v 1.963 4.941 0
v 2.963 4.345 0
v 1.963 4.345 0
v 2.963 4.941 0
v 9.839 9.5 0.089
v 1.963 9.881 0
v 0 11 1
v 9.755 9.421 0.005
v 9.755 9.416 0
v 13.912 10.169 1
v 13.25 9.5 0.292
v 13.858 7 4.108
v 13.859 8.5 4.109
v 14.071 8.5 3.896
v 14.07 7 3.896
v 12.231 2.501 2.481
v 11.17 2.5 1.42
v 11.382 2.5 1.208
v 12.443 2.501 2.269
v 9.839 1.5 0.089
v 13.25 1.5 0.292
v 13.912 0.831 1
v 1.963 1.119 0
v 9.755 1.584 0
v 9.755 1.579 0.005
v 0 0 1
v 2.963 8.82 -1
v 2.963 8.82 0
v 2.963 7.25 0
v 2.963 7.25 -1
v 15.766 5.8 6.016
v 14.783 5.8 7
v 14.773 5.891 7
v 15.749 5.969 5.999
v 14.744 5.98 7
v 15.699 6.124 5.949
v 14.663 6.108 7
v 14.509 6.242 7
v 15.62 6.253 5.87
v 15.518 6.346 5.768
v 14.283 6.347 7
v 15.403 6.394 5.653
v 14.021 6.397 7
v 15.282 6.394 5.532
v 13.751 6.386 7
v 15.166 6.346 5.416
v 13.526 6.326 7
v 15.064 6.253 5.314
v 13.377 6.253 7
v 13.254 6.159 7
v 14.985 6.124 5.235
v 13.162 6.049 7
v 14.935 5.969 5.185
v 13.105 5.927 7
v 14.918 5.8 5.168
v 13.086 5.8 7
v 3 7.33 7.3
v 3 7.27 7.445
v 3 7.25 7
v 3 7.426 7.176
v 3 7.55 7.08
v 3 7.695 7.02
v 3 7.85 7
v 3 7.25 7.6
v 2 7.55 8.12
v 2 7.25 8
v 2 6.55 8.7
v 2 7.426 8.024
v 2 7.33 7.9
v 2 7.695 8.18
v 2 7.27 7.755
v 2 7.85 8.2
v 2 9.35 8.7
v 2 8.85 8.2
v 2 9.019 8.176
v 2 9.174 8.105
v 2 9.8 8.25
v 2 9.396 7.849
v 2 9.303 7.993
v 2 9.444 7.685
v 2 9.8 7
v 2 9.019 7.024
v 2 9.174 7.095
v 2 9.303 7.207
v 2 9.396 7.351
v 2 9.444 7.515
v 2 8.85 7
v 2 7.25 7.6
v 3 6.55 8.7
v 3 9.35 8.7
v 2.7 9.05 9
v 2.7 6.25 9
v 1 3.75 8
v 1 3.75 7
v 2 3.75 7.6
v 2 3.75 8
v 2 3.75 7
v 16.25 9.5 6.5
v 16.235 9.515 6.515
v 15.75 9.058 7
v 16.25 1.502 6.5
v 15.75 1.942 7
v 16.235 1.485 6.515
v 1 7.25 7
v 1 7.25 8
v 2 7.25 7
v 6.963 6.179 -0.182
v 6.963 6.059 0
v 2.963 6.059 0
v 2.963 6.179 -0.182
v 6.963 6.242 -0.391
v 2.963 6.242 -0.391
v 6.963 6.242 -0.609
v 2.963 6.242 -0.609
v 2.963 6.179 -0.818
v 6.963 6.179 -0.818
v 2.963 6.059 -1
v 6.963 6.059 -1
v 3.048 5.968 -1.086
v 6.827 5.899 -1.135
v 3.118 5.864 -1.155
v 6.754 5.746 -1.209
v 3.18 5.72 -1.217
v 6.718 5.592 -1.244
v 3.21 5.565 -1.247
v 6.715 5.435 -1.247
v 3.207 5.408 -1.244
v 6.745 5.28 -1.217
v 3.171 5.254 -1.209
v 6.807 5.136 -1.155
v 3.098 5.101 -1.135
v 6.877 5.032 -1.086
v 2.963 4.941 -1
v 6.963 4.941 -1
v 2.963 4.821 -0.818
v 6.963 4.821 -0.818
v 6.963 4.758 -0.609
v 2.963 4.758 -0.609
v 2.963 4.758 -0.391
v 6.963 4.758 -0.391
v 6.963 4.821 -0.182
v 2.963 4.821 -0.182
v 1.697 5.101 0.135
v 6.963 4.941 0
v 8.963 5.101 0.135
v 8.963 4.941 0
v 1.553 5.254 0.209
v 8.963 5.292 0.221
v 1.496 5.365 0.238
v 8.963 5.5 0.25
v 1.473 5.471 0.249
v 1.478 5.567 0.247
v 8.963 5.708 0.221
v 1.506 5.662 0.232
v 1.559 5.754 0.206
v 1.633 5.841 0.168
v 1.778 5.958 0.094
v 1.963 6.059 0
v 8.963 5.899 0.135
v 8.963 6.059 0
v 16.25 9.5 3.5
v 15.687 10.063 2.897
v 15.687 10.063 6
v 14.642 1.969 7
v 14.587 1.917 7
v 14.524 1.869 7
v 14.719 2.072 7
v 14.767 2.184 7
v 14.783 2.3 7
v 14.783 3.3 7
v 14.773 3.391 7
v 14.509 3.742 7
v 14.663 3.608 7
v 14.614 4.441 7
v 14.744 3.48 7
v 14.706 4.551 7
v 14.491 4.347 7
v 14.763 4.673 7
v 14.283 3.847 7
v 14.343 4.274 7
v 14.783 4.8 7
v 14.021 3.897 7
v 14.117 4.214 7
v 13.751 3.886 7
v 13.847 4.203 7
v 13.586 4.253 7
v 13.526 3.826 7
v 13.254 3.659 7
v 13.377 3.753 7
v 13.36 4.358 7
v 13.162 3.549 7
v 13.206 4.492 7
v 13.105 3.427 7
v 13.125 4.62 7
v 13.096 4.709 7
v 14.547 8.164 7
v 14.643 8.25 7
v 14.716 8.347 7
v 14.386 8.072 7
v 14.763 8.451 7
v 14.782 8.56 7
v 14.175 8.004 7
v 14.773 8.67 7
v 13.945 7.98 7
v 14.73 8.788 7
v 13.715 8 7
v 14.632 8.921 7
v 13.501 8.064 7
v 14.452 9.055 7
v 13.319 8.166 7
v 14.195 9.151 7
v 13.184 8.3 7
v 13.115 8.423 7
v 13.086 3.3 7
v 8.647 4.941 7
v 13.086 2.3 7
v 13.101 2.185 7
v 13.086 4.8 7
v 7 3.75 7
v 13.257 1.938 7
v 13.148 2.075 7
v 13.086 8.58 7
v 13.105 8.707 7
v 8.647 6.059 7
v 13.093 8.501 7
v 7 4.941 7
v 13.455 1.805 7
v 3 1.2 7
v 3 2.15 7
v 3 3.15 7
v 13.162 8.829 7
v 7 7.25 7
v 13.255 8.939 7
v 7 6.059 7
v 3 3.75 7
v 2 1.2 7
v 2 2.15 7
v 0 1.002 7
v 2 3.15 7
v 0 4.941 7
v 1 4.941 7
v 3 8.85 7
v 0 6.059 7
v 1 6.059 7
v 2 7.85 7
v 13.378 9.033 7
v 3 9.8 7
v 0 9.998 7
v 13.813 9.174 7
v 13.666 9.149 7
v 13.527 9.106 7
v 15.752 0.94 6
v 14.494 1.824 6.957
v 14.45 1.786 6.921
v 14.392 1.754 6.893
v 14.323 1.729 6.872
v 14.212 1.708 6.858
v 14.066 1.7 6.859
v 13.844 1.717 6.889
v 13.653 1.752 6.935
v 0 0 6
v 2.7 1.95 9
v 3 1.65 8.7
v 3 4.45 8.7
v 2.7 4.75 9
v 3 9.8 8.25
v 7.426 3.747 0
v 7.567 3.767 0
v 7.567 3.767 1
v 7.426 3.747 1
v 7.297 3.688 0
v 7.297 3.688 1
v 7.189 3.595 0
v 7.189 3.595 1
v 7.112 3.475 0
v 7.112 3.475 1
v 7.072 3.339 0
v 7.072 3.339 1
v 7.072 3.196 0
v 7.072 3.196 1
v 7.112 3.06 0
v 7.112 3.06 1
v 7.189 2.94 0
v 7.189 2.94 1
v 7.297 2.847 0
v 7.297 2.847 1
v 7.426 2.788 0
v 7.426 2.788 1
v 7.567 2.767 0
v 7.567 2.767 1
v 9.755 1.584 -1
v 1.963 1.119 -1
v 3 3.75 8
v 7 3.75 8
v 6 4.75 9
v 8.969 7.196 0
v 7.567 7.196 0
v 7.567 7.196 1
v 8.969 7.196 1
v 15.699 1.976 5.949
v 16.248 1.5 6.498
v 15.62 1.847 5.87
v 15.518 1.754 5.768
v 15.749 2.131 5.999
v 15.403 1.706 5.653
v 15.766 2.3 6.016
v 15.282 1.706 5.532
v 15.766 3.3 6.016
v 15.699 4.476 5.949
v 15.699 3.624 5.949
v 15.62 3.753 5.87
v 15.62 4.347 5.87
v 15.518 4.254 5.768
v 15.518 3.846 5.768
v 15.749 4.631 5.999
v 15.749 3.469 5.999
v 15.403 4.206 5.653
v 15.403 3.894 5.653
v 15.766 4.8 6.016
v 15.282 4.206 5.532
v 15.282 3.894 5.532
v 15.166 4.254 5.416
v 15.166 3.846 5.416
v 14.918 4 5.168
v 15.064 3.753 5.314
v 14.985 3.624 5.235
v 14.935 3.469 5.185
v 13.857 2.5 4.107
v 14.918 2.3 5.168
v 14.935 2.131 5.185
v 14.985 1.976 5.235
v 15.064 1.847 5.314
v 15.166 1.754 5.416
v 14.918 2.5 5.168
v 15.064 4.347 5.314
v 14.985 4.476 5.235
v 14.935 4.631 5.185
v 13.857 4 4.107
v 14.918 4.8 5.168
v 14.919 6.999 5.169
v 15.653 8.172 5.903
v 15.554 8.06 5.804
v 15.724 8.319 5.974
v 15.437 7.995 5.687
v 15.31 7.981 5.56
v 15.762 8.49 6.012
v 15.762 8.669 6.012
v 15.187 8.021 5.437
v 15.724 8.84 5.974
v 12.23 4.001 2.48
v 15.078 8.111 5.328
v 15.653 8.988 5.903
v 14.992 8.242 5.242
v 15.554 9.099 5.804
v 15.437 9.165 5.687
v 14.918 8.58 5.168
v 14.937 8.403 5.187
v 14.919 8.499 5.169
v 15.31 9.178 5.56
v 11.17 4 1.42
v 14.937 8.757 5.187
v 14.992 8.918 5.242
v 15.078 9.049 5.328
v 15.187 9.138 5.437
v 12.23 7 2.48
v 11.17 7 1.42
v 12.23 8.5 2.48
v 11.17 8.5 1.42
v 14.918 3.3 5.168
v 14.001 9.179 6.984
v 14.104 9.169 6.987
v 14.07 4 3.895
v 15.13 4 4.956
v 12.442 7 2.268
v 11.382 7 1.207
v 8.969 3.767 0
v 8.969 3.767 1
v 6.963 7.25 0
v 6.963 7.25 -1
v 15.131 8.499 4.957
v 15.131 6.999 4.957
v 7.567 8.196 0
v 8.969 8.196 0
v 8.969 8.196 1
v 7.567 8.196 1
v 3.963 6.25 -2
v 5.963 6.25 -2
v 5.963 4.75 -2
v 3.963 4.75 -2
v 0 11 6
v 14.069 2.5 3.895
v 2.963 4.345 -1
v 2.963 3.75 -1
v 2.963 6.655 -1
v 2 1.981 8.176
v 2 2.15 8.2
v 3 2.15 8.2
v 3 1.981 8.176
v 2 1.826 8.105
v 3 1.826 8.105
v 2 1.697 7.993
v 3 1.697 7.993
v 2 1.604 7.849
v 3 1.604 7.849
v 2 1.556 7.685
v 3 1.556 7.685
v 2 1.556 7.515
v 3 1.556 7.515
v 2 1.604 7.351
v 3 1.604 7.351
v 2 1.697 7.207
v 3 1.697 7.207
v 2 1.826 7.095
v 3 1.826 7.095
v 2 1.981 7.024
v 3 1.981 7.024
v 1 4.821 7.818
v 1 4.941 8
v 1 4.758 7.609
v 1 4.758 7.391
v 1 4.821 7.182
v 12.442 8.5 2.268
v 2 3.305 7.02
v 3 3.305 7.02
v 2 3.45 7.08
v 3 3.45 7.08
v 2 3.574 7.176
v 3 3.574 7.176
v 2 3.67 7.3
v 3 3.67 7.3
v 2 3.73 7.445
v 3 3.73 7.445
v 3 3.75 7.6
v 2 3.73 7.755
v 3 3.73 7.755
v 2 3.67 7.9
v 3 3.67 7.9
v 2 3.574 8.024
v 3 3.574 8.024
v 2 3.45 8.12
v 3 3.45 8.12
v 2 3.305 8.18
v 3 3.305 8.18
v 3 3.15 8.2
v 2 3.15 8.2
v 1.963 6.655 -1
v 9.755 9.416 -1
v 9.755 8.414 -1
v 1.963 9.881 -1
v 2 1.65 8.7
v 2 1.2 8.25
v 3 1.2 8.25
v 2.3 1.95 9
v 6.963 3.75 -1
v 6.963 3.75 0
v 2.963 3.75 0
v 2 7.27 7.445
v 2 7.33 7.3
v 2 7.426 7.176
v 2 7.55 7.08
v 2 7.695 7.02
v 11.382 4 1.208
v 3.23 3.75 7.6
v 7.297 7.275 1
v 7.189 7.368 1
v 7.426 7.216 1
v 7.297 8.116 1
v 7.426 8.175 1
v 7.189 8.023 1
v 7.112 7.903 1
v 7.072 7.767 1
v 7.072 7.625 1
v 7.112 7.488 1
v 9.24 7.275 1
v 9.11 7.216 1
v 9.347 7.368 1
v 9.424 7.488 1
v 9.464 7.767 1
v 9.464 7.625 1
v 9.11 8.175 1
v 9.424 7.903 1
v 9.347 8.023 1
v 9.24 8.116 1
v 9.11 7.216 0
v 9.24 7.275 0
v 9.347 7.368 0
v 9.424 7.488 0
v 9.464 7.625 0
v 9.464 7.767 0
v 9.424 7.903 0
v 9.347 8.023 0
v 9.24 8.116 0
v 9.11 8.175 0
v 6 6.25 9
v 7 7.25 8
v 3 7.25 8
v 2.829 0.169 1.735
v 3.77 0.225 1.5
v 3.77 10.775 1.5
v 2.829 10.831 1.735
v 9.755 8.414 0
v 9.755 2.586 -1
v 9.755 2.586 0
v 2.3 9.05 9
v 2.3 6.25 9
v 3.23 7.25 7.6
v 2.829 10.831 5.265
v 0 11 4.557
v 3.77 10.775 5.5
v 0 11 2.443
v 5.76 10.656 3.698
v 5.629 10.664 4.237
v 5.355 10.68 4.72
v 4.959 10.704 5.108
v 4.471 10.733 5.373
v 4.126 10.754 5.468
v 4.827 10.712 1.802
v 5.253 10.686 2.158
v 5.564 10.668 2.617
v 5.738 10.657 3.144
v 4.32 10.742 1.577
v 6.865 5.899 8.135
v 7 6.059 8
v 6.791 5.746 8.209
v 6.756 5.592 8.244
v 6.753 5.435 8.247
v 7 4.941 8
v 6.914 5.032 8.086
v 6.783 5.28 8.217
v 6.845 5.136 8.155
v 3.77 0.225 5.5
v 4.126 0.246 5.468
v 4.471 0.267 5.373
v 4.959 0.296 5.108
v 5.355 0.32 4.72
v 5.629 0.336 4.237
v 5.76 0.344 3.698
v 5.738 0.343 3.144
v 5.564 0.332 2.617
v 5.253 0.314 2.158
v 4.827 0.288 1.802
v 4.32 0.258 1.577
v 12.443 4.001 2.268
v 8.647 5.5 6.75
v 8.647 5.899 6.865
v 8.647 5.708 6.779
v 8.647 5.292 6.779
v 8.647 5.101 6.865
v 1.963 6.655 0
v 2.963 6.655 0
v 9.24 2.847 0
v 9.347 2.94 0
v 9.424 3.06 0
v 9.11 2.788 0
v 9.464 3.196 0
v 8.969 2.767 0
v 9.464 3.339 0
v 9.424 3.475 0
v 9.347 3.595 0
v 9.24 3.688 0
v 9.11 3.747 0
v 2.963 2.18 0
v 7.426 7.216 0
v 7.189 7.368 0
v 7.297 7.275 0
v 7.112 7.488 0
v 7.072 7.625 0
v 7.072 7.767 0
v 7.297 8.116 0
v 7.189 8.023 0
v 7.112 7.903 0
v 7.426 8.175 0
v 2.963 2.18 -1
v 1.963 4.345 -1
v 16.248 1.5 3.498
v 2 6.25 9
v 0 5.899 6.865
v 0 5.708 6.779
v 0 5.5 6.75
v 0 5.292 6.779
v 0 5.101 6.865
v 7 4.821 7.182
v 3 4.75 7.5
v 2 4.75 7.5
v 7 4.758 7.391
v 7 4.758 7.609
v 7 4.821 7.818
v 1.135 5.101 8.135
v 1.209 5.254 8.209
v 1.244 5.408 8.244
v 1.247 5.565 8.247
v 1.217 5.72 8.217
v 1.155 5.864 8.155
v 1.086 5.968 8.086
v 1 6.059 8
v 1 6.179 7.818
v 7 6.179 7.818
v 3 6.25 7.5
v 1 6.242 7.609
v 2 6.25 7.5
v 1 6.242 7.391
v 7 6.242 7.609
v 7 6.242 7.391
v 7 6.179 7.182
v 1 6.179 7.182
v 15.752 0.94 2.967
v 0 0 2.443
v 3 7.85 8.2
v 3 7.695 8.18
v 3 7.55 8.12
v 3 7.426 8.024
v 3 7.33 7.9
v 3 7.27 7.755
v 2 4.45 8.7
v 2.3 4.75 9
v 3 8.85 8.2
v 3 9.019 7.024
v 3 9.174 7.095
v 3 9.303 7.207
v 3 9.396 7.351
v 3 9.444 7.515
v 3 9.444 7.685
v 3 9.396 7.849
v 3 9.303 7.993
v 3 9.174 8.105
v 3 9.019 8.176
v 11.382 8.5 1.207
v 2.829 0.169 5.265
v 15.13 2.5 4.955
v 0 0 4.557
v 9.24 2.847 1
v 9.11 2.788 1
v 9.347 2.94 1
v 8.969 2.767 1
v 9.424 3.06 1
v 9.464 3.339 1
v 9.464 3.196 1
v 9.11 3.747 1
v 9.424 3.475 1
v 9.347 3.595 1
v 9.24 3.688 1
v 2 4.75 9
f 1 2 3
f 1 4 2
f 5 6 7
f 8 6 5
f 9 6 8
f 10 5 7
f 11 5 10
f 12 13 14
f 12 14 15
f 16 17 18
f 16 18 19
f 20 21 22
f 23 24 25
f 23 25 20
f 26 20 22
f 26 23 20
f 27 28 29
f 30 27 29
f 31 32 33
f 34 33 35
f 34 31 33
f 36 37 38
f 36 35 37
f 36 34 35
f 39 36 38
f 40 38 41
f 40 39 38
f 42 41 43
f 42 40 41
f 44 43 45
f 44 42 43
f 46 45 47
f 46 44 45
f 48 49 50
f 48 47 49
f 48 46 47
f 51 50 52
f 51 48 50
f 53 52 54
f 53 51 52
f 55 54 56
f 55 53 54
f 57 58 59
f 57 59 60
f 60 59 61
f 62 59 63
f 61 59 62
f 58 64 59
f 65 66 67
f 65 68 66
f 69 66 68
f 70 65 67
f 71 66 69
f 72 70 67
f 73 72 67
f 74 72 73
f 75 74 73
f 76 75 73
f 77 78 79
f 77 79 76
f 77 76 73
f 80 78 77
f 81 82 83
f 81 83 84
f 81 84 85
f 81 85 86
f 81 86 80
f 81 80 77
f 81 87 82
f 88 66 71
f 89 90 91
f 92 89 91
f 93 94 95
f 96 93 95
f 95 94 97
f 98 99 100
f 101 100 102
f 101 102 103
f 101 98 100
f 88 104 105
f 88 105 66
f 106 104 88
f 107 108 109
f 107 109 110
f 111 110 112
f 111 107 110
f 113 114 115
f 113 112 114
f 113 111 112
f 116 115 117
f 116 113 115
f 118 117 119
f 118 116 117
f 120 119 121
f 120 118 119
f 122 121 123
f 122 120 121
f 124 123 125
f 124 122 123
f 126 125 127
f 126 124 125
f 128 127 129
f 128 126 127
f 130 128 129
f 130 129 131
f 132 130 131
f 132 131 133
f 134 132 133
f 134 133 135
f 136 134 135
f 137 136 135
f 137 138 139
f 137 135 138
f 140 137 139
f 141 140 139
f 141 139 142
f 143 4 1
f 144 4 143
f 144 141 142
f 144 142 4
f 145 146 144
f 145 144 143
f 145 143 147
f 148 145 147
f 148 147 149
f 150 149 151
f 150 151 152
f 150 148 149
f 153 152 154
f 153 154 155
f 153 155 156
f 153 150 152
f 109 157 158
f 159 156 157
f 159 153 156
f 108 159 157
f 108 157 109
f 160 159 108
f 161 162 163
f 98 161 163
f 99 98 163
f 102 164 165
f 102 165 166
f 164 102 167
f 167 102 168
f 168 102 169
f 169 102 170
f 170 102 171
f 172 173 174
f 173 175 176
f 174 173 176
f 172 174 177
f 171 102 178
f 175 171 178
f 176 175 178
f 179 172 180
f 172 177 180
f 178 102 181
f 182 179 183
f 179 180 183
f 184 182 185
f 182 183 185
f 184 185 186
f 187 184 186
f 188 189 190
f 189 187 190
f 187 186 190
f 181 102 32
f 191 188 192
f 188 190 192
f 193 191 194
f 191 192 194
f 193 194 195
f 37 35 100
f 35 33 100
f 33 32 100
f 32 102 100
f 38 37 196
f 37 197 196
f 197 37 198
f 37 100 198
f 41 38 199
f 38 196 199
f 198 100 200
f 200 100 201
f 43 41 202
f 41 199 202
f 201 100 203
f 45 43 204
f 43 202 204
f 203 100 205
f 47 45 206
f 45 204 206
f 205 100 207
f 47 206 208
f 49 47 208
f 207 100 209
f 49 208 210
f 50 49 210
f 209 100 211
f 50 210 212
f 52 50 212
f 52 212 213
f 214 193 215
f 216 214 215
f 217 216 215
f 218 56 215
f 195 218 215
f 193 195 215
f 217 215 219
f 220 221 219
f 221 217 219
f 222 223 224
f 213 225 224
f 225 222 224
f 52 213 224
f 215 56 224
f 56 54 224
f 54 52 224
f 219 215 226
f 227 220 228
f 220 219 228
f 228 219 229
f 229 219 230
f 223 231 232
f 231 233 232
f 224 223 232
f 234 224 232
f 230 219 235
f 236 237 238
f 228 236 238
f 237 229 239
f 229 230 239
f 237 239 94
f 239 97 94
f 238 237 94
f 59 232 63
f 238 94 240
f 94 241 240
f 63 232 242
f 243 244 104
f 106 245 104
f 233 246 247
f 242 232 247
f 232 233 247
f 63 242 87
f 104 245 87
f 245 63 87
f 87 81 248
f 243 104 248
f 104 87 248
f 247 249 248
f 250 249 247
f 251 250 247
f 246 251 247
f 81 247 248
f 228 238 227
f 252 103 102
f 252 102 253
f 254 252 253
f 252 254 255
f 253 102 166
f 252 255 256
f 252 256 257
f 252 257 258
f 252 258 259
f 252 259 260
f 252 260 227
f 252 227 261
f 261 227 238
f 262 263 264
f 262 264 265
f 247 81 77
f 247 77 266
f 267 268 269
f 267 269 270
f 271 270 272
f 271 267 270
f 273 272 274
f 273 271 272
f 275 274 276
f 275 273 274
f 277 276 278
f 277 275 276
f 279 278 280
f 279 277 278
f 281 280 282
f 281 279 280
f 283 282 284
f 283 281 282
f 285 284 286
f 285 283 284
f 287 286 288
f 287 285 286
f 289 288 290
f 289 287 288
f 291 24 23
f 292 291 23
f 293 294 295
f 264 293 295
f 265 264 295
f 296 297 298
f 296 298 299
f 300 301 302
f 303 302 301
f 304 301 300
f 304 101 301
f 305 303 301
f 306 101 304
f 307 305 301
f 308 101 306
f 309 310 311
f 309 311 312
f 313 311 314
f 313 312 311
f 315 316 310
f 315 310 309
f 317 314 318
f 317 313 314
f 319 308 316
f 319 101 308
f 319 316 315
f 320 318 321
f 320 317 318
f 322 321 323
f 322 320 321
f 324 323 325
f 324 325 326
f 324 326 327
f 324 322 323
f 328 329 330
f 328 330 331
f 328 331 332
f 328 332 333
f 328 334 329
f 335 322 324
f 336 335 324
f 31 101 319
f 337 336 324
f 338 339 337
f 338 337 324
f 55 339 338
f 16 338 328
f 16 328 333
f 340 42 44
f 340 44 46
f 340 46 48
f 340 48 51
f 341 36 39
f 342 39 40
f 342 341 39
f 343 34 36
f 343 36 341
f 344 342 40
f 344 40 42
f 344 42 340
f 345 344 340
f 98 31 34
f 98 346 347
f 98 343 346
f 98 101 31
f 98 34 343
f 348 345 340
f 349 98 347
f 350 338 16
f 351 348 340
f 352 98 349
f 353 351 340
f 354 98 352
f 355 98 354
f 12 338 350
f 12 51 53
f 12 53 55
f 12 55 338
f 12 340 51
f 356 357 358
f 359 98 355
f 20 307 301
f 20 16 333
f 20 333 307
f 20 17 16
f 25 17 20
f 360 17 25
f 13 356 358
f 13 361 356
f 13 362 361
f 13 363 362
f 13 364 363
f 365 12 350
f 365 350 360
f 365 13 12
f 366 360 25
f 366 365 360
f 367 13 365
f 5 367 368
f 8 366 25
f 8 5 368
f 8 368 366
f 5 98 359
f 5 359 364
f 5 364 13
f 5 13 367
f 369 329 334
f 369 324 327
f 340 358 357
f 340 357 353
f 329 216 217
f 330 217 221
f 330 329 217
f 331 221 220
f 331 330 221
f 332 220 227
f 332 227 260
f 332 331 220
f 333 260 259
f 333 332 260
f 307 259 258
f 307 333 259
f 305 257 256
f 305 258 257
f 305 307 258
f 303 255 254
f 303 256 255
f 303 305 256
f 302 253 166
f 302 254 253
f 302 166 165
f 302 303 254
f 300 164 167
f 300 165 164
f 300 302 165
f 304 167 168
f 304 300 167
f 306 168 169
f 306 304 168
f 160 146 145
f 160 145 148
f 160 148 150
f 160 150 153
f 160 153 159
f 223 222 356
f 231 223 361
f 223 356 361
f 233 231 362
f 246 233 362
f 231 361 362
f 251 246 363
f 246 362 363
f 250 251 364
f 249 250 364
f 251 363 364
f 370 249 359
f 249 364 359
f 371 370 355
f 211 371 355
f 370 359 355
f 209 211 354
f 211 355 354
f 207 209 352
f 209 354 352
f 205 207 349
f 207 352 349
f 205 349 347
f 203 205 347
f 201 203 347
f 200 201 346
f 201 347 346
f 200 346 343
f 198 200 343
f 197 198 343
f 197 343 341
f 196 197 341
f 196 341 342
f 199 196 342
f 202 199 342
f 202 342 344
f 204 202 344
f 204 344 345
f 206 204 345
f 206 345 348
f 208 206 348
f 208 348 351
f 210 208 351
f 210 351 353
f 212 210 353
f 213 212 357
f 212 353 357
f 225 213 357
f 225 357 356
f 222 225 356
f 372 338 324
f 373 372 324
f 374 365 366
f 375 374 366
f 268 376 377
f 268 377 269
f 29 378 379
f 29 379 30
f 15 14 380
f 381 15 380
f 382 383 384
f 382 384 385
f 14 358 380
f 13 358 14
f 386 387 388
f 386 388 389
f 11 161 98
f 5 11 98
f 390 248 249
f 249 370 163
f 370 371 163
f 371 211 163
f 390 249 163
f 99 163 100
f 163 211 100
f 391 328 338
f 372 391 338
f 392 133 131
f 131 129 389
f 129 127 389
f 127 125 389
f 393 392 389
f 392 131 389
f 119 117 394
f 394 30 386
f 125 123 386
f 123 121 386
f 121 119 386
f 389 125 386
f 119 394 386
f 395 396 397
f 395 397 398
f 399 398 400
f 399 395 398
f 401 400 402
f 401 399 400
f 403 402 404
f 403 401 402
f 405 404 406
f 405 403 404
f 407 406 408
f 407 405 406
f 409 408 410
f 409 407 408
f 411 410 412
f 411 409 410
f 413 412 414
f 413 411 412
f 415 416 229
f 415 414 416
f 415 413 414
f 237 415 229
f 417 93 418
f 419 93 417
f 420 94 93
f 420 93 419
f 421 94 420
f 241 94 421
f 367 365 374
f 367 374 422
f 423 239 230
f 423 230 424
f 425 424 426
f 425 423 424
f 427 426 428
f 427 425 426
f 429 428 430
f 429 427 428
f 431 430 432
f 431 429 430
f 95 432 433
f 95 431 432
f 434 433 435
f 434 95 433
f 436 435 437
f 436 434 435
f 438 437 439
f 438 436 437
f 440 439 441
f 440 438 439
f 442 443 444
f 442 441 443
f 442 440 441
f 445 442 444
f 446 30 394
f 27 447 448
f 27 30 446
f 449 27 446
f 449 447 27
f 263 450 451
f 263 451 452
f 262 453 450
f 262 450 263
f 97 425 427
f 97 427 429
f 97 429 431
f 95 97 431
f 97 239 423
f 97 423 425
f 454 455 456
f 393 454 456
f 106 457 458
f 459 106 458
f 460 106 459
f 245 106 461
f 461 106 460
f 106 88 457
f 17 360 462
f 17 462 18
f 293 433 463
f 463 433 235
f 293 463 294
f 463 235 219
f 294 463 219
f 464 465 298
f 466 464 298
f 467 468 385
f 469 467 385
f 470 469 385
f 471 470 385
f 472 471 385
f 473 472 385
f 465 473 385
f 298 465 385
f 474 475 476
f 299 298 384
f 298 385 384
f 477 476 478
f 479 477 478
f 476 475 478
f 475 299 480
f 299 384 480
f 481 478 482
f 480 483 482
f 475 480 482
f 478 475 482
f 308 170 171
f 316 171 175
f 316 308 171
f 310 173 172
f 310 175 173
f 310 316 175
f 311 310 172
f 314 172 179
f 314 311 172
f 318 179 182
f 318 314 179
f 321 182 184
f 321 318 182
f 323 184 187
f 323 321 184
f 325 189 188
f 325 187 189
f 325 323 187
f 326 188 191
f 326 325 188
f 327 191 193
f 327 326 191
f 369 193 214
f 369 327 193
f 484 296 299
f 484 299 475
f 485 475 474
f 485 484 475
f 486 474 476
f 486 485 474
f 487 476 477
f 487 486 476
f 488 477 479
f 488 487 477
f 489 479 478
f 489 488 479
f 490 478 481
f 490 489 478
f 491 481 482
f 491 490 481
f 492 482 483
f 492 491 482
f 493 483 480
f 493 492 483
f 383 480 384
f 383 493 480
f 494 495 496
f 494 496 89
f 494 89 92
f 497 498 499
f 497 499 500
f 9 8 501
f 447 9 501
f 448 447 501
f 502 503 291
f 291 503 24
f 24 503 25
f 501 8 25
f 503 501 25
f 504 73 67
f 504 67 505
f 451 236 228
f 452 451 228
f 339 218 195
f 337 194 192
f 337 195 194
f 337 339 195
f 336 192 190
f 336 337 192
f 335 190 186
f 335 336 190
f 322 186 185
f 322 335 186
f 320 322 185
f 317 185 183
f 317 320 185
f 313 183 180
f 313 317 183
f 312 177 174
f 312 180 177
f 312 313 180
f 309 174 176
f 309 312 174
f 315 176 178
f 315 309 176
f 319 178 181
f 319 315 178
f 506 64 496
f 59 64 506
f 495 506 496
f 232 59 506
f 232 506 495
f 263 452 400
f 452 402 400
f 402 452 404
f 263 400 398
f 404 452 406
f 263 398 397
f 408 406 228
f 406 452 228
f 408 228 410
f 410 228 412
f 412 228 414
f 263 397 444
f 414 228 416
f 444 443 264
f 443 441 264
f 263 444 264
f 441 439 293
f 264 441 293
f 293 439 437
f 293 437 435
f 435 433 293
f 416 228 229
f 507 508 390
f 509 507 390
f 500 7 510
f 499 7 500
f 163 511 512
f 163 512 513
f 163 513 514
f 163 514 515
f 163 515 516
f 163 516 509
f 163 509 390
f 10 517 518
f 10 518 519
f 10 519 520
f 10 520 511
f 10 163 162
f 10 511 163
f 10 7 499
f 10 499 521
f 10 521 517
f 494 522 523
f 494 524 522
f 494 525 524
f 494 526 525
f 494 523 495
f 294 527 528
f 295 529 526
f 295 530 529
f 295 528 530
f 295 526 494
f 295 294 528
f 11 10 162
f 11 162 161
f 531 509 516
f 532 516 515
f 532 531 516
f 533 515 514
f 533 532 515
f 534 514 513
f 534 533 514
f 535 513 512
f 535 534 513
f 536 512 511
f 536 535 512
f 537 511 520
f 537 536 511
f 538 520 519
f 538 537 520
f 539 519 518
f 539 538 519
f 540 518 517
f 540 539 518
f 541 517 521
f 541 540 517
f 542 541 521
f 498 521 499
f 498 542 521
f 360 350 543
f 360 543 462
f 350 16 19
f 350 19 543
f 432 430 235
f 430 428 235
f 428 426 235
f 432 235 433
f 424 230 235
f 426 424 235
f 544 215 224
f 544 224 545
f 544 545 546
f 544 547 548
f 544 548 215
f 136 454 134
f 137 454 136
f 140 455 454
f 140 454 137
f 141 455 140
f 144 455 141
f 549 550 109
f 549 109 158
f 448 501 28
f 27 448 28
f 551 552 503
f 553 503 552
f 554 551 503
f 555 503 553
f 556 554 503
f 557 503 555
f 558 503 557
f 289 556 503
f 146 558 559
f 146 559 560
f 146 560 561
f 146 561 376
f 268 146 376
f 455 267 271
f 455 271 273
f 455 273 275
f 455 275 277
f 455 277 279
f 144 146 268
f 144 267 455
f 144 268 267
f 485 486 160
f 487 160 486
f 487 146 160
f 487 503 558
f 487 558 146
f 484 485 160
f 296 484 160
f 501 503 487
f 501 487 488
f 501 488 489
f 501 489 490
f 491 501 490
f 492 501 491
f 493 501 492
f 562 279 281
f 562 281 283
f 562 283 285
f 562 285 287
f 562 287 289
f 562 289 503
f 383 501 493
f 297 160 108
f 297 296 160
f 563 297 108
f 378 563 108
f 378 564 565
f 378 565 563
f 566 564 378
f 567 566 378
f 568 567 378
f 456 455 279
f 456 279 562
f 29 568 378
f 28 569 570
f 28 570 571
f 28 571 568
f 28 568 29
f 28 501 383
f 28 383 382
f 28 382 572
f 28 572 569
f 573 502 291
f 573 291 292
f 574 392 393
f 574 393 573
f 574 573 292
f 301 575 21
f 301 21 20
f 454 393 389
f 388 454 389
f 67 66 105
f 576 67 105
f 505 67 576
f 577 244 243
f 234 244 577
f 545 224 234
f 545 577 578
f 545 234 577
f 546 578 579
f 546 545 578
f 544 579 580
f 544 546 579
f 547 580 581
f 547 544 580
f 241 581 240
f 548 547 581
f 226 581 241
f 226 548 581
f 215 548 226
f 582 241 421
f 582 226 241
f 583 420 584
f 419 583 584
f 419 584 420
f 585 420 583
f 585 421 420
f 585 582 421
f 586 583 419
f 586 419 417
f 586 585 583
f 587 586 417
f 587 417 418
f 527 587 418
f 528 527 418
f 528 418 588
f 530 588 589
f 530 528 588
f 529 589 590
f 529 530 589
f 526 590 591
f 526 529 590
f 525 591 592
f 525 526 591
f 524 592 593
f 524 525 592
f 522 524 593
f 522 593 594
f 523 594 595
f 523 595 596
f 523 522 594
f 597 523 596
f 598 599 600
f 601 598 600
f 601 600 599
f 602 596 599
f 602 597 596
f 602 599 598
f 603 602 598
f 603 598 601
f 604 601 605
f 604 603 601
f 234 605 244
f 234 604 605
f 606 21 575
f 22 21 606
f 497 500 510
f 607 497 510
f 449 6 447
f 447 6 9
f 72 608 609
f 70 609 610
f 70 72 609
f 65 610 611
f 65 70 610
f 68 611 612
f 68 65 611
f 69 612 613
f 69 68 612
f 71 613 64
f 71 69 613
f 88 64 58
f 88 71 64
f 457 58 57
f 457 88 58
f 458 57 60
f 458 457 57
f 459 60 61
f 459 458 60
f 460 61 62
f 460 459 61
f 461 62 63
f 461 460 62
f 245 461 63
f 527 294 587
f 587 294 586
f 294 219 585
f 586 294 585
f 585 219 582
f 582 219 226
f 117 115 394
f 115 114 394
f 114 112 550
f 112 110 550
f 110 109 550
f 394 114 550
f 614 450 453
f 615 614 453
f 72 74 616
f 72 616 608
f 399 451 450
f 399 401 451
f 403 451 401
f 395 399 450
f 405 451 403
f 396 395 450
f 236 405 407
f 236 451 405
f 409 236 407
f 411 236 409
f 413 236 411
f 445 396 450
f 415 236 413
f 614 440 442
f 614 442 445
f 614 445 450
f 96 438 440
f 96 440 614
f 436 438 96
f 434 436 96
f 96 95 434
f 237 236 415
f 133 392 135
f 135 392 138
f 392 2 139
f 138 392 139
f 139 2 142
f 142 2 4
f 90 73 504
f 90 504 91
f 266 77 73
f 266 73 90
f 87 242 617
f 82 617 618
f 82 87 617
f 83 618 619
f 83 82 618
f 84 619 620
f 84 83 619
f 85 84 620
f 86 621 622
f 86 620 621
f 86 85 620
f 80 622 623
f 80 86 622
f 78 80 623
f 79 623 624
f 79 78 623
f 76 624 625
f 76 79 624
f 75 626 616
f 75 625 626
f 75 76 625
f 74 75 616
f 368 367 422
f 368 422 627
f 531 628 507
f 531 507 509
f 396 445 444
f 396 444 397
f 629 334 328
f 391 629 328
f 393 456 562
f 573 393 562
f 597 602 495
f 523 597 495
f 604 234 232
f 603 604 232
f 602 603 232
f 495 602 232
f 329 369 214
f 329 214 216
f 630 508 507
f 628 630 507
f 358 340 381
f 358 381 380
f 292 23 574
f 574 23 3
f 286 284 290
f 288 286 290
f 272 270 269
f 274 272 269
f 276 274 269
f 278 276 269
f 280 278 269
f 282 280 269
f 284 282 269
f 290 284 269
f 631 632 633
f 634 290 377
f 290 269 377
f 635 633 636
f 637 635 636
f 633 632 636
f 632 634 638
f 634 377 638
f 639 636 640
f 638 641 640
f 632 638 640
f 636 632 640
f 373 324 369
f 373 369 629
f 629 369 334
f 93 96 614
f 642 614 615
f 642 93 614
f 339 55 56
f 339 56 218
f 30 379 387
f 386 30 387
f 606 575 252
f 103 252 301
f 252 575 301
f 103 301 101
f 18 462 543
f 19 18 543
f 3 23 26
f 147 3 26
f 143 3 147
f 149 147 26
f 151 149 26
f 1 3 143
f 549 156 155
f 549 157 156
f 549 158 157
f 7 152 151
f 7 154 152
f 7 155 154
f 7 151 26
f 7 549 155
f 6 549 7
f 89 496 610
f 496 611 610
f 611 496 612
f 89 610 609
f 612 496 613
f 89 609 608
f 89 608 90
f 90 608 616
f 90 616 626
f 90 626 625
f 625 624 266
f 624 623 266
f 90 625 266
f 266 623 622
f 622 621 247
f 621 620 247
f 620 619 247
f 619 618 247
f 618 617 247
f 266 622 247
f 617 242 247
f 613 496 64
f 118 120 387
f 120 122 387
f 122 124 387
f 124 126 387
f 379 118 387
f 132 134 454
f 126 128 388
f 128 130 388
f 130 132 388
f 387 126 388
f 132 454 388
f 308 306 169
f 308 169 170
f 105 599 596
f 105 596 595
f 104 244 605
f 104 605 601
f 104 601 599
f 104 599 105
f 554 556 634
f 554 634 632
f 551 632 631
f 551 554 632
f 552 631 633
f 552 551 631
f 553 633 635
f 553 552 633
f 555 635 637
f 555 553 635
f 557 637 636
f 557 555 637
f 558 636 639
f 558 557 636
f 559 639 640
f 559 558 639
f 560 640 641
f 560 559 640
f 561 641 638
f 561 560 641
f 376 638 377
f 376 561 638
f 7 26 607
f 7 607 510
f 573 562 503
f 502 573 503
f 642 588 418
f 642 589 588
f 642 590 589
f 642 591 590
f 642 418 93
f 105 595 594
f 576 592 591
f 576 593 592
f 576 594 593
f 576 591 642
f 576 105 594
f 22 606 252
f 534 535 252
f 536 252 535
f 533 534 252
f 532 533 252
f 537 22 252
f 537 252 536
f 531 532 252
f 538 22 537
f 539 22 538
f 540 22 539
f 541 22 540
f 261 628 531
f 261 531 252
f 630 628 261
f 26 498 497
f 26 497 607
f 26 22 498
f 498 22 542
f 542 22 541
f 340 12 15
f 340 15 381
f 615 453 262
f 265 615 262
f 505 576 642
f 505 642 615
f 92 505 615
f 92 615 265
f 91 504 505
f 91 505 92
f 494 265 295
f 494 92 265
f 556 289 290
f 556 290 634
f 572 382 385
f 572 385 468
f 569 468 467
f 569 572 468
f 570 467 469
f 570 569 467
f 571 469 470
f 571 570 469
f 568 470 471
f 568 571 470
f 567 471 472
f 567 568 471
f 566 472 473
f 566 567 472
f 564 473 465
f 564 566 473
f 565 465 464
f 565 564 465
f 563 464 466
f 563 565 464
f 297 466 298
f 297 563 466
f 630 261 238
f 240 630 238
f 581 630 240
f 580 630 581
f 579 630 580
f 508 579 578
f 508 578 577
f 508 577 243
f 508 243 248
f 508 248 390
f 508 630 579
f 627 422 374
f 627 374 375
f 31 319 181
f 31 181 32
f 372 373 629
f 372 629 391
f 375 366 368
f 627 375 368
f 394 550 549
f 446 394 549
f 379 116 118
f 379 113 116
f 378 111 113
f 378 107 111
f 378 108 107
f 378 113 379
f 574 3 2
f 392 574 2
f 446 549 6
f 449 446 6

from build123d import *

# Parameters (mm, degrees)
BOSS_EXTRUDE1_DEPTH      = 7
CHAMFER1_SIZE            = 1
CHAMFER7_SIZE            = 1
CHAMFER7_EDGE_2_SIZE     = 1
CHAMFER7_EDGE_2_SIZE2    = 1.065385663
CHAMFER7_EDGE_3_SIZE     = 1
CHAMFER7_EDGE_4_SIZE     = 1
CHAMFER7_EDGE_4_SIZE2    = 1.065385663
CHAMFER14_SIZE           = 1
CHAMFER14_SIZE2          = 1.962610506
SKETCH13_W               = 6
SKETCH13_H               = 3.5
BOSS_EXTRUDE4_DEPTH      = 2
CUT_EXTRUDE9_DEPTH       = 2
CUT_EXTRUDE9_DEPTH_BACK  = 7.647280269
SKETCH14_R               = 0.75
CHAMFER15_SIZE           = 1
SKETCH15_W               = 4
SKETCH15_H               = 3.5
BOSS_EXTRUDE6_DEPTH      = 2
CUT_EXTRUDE10_DEPTH      = 2
CUT_EXTRUDE10_DEPTH_BACK = 6
SKETCH18_R               = 0.75
CHAMFER16_SIZE           = 1
CUT_EXTRUDE12_REACH      = 23.967
SKETCH19_W               = 7.661214419
SKETCH19_H               = 8
CUT_EXTRUDE14_DEPTH      = 10
CUT_EXTRUDE14_DEPTH_BACK = 2
SKETCH23_W               = 1.5
SKETCH23_H               = 1.5
BOSS_EXTRUDE7_DEPTH      = 0.3
SKETCH30_W               = 1
SKETCH30_H               = 3.55
BOSS_EXTRUDE12_DEPTH     = 2
CHAMFER19_SIZE           = 0.3
CHAMFER20_SIZE           = 0.75
CUT_EXTRUDE32_DEPTH      = 1.23
CUT_EXTRUDE33_REACH      = 23.588
CUT_EXTRUDE34_REACH      = 23.045
SKETCH38_R               = 0.6
BOSS_EXTRUDE13_DEPTH     = 1
CUT_EXTRUDE35_DEPTH      = 1


with BuildPart() as part:
    # Sketch2 → Boss-Extrude1 (new body)
    with BuildSketch(Plane.XY):
        Polygon((0, 0), (0, 11), (16.75, 10), (16.75, 1), align=None)
    extrude(amount=BOSS_EXTRUDE1_DEPTH)

    # Chamfer1
    chamfer1_edges = [part.edges().sort_by_distance(p)[0] for p in [
        (8.375, 10.5, 7),
        (8.375, 0.5, 7),
        (8.375, 10.5, 0),
        (8.375, 0.5, 0),
    ]]
    chamfer(chamfer1_edges, length=CHAMFER1_SIZE)

    # Chamfer7
    chamfer7_edges = [part.edges().sort_by_distance(p)[0] for p in [
        (16.75, 5.5, 7),
    ]]
    chamfer(chamfer7_edges, length=CHAMFER7_SIZE)

    # Chamfer7 edge 2
    chamfer7_edge_2_edges = [part.edges().sort_by_distance(p)[0] for p in [
        (16.75, 1, 3.5),
    ]]
    chamfer7_edge_2_side = [part.faces().sort_by_distance(p)[0] for p in [
        (8.375, 0.5, 3.5),
    ]]
    chamfer(chamfer7_edge_2_edges, length=CHAMFER7_EDGE_2_SIZE, length2=CHAMFER7_EDGE_2_SIZE2, reference=chamfer7_edge_2_side[0])

    # Chamfer7 edge 3
    chamfer7_edge_3_edges = [part.edges().sort_by_distance(p)[0] for p in [
        (16.75, 5.5, 0),
    ]]
    chamfer(chamfer7_edge_3_edges, length=CHAMFER7_EDGE_3_SIZE)

    # Chamfer7 edge 4
    chamfer7_edge_4_edges = [part.edges().sort_by_distance(p)[0] for p in [
        (16.75, 10, 3.5),
    ]]
    chamfer7_edge_4_side = [part.faces().sort_by_distance(p)[0] for p in [
        (16.75, 5.5, 3.5),
    ]]
    chamfer(chamfer7_edge_4_edges, length=CHAMFER7_EDGE_4_SIZE, length2=CHAMFER7_EDGE_4_SIZE2, reference=chamfer7_edge_4_side[0])

    # Chamfer14
    chamfer14_edges = [part.edges().sort_by_distance(p)[0] for p in [
        (0, 5.5, 0),
    ]]
    chamfer14_side = [part.faces().sort_by_distance(p)[0] for p in [
        (0, 5.5, 3.5),
    ]]
    chamfer(chamfer14_edges, length=CHAMFER14_SIZE, length2=CHAMFER14_SIZE2, reference=chamfer14_side[0])

    # Sketch13 → Boss-Extrude4 (add)
    with BuildSketch(Plane.XY.offset(7)):
        with Locations((4, 5.5)):
            Rectangle(SKETCH13_W, SKETCH13_H)
    extrude(amount=BOSS_EXTRUDE4_DEPTH)

    # Sketch14 → Cut-Extrude9 (cut, two sides: drawn at the far end of the back side and taken through both)
    with BuildSketch(Plane.ZY.offset(-1).offset(-CUT_EXTRUDE9_DEPTH_BACK)):
        with Locations(Location((7.5, 5.5, 0), (0, 0, 131.810314896))):
            Circle(SKETCH14_R)
    extrude(amount=CUT_EXTRUDE9_DEPTH + CUT_EXTRUDE9_DEPTH_BACK, mode=Mode.SUBTRACT)

    # Chamfer15
    # the kernel refuses this chamfer: 1 mm, written as the material it takes off along each edge
    with BuildSketch(Plane(origin=(7, 1.178317012, 9), x_dir=(0.027495876610586487, 0, -0.9996219169112968), z_dir=(0, 1, 0)), Plane(origin=(1, 9.821682988, 9), x_dir=(-0.02749587661058638, 0, -0.9996219169112968), z_dir=(0, -1, 0))) as chamfer15_piece_1:
        Polygon((CHAMFER15_SIZE * 0.999621916911, CHAMFER15_SIZE * 0.0274958766106), (-CHAMFER15_SIZE * 0.0274958766106, CHAMFER15_SIZE * 0.999621916911), (0, 0), align=None)
    extrude(amount=8.643365976, mode=Mode.SUBTRACT)
    with BuildSketch(Plane(origin=(9.571682988, 7.25, 9), x_dir=(0, 0.027495876610586487, -0.9996219169112968), z_dir=(-1, 0, 0)), Plane(origin=(-1.571682988, 3.75, 9), x_dir=(0, -0.027495876610586487, -0.9996219169112968), z_dir=(1, 0, 0))) as chamfer15_piece_2:
        Polygon((CHAMFER15_SIZE * 0.999621916911, CHAMFER15_SIZE * 0.0274958766106), (-CHAMFER15_SIZE * 0.0274958766106, CHAMFER15_SIZE * 0.999621916911), (0, 0), align=None)
    extrude(amount=11.143365976, mode=Mode.SUBTRACT)

    # Sketch15 → Boss-Extrude6 (add)
    with BuildSketch(Plane(origin=(0, 0, 0), x_dir=(-1, 0, 0), z_dir=(0, 0, -1))):
        with Locations((-4.962610506, 5.5)):
            Rectangle(SKETCH15_W, SKETCH15_H)
    extrude(amount=BOSS_EXTRUDE6_DEPTH)

    # Sketch18 → Cut-Extrude10 (cut, two sides: drawn at the far end of the back side and taken through both)
    with BuildSketch(Plane.ZY.offset(-2.962610506).offset(-CUT_EXTRUDE10_DEPTH_BACK)):
        with Locations(Location((-0.5, 5.5, 0), (0, 0, 48.189685104))):
            Circle(SKETCH18_R)
    extrude(amount=CUT_EXTRUDE10_DEPTH + CUT_EXTRUDE10_DEPTH_BACK, mode=Mode.SUBTRACT)

    # Chamfer16
    # the kernel refuses this chamfer: 1 mm, written as the material it takes off along each edge
    with BuildSketch(Plane(origin=(6.962610506, 1.178317012, -2), x_dir=(0.027495876610586487, 0, 0.9996219169112968), z_dir=(0, 1, 0)), Plane(origin=(2.962610506, 9.821682988, -2), x_dir=(-0.027495876610586487, 0, 0.9996219169112968), z_dir=(0, -1, 0))) as chamfer16_piece_1:
        Polygon((CHAMFER16_SIZE * 0.999621916911, -CHAMFER16_SIZE * 0.0274958766106), (-CHAMFER16_SIZE * 0.0274958766106, -CHAMFER16_SIZE * 0.999621916911), (0, 0), align=None)
    extrude(amount=8.643365976, mode=Mode.SUBTRACT)
    with BuildSketch(Plane(origin=(0.390927518, 3.75, -2), x_dir=(0, -0.027495876610586487, 0.9996219169112968), z_dir=(1, 0, 0)), Plane(origin=(9.534293493, 7.25, -2), x_dir=(0, 0.027495876610586487, 0.9996219169112968), z_dir=(-1, 0, 0))) as chamfer16_piece_2:
        Polygon((CHAMFER16_SIZE * 0.999621916911, -CHAMFER16_SIZE * 0.0274958766106), (-CHAMFER16_SIZE * 0.0274958766106, -CHAMFER16_SIZE * 0.999621916911), (0, 0), align=None)
    extrude(amount=9.143365976, mode=Mode.SUBTRACT)

    # Cut-Extrude12: up to this plane
    cut_extrude12_end = Plane(origin=(4.875, 0, -4.875), z_dir=(0.7071067811865475, 0, -0.7071067811865477))
    # Sketch19 → Cut-Extrude12 (cut, up to the surface)
    with BuildSketch(Plane(origin=(0, 0, 0), x_dir=(-1, 0, 0), z_dir=(0, 0, -1)), mode=Mode.PRIVATE) as cut_extrude12_sk1:
        with Locations((-13.585935075, 5.5)):
            Rectangle(SKETCH19_W, SKETCH19_H)
    cut_extrude12_tool1 = split(extrude(cut_extrude12_sk1.sketch, amount=-CUT_EXTRUDE12_REACH, mode=Mode.PRIVATE), bisect_by=cut_extrude12_end, keep=Keep.BOTH, mode=Mode.PRIVATE)
    add(cut_extrude12_tool1.solids().sort_by_distance((13.585935, 5.5, 0))[0], mode=Mode.SUBTRACT)

    # Sketch21 → Cut-Extrude14 (cut, two sides: drawn at the far end of the back side and taken through both)
    with BuildSketch(Plane.XZ.offset(-9.5).offset(-CUT_EXTRUDE14_DEPTH_BACK)):
        Polygon((16.25, 3.5), (16.25, 0.5), (16.25, -4.059078881), (11.307076373, -4.059078881), (13.25, 0.292304862), align=None)
    extrude(amount=CUT_EXTRUDE14_DEPTH + CUT_EXTRUDE14_DEPTH_BACK, mode=Mode.SUBTRACT)

    # Sketch23 → Boss-Extrude7 (add)
    with BuildSketch(Plane(origin=(4.875, 0, -4.875), x_dir=(-0.7071067811865476, 0, -0.7071067811865476), z_dir=(0.7071067811865476, 0, -0.7071067811865476))):
        Polygon((-10.402444277, 2.500721643), (-10.402135029, 4.000721611), (-8.902135061, 4.000412363), (-8.902444309, 2.500412395), align=None)
        with Locations((-9.651825855, 7.75)):
            Rectangle(SKETCH23_W, SKETCH23_H)
        Polygon((-12.702349723, 2.500380076), (-12.703104511, 4.000379886), (-14.203104321, 3.999625098), (-14.202349533, 2.499625288), align=None)
        Polygon((-14.204750024, 8.499212445), (-12.70475009, 8.499657985), (-12.70430455, 6.999658051), (-14.204304484, 6.999212511), align=None)
    extrude(amount=BOSS_EXTRUDE7_DEPTH)

    # Sketch30 → Boss-Extrude12 (add)
    with BuildSketch(Plane.XY.offset(7)):
        with Locations((2.5, 8.025)):
            Rectangle(SKETCH30_W, SKETCH30_H)
        with Locations((2.5, 2.975)):
            Rectangle(SKETCH30_W, SKETCH30_H)
    extrude(amount=BOSS_EXTRUDE12_DEPTH)

    # Chamfer19
    # the kernel refuses this chamfer: 0.3 mm, written as the material it takes off along each edge
    with BuildSketch(Plane(origin=(2, 6.25, 9), x_dir=(-0.027495876610586622, 0, -0.9996219169112968), z_dir=(0, 1, 0))) as chamfer19_piece_1_section:
        Polygon((CHAMFER19_SIZE * 0.999621916911, -CHAMFER19_SIZE * 0.0274958766106), (-CHAMFER19_SIZE * 0.0274958766106, -CHAMFER19_SIZE * 0.999621916911), (0, 0), align=None)
    chamfer19_piece_1 = extrude(amount=4.321504896, mode=Mode.PRIVATE)
    chamfer19_piece_1 = split(chamfer19_piece_1, bisect_by=Plane(origin=(2.100724638, 7.211413043, 8.038586957), z_dir=(0, 0.7071067811862649, 0.7071067811868302)), keep=Keep.TOP, mode=Mode.PRIVATE)
    add(chamfer19_piece_1, mode=Mode.SUBTRACT)
    with BuildSketch(Plane(origin=(3, 10.571504896, 9), x_dir=(0.027495876610585904, 0, -0.9996219169112968), z_dir=(0, -1, 0))) as chamfer19_piece_2_section:
        Polygon((CHAMFER19_SIZE * 0.999621916911, -CHAMFER19_SIZE * 0.0274958766106), (-CHAMFER19_SIZE * 0.0274958766106, -CHAMFER19_SIZE * 0.999621916911), (0, 0), align=None)
    chamfer19_piece_2 = extrude(amount=5.093009793, mode=Mode.PRIVATE)
    chamfer19_piece_2 = split(chamfer19_piece_2, bisect_by=Plane(origin=(2.899275362, 7.211413043, 8.038586957), z_dir=(0, 0.7071067811862649, 0.7071067811868302)), keep=Keep.TOP, mode=Mode.PRIVATE)
    add(chamfer19_piece_2, mode=Mode.SUBTRACT)
    with BuildSketch(Plane(origin=(2, 0.428495104, 9), x_dir=(-0.027495876610586622, 0, -0.9996219169112968), z_dir=(0, 1, 0))) as chamfer19_piece_3_section:
        Polygon((CHAMFER19_SIZE * 0.999621916911, -CHAMFER19_SIZE * 0.0274958766106), (-CHAMFER19_SIZE * 0.0274958766106, -CHAMFER19_SIZE * 0.999621916911), (0, 0), align=None)
    chamfer19_piece_3 = extrude(amount=4.321504896, mode=Mode.PRIVATE)
    chamfer19_piece_3 = split(chamfer19_piece_3, bisect_by=Plane(origin=(2.100724638, 3.788586957, 8.038586957), z_dir=(0, -0.7071067811862649, 0.7071067811868302)), keep=Keep.TOP, mode=Mode.PRIVATE)
    add(chamfer19_piece_3, mode=Mode.SUBTRACT)
    with BuildSketch(Plane(origin=(3, 5.521504896, 9), x_dir=(0.027495876610585904, 0, -0.9996219169112968), z_dir=(0, -1, 0))) as chamfer19_piece_4_section:
        Polygon((CHAMFER19_SIZE * 0.999621916911, -CHAMFER19_SIZE * 0.0274958766106), (-CHAMFER19_SIZE * 0.0274958766106, -CHAMFER19_SIZE * 0.999621916911), (0, 0), align=None)
    chamfer19_piece_4 = extrude(amount=5.093009793, mode=Mode.PRIVATE)
    chamfer19_piece_4 = split(chamfer19_piece_4, bisect_by=Plane(origin=(2.899275362, 3.788586957, 8.038586957), z_dir=(0, -0.7071067811862649, 0.7071067811868302)), keep=Keep.TOP, mode=Mode.PRIVATE)
    add(chamfer19_piece_4, mode=Mode.SUBTRACT)

    # Chamfer20
    chamfer20_edges = [part.edges().sort_by_distance(p)[0] for p in [
        (2.5, 1.2, 9),
        (2.5, 9.8, 9),
    ]]
    chamfer(chamfer20_edges, length=CHAMFER20_SIZE)

    # Sketch35 → Cut-Extrude32 (cut)
    with BuildSketch(Plane.ZY.offset(-2)):
        with BuildLine():
            Line((8.2, 8.85), (8.2, 7.85))
            ThreePointArc((8.2, 7.85), (7.6, 7.25), (7, 7.85))
            Line((7, 7.85), (7, 8.85))
            ThreePointArc((7, 8.85), (7.6, 9.45), (8.2, 8.85))
        make_face()
        with BuildLine():
            Line((8.2, 3.15), (8.2, 2.15))
            ThreePointArc((8.2, 2.15), (7.6, 1.55), (7, 2.15))
            Line((7, 2.15), (7, 3.15))
            ThreePointArc((7, 3.15), (7.6, 3.75), (8.2, 3.15))
        make_face()
    extrude(amount=-CUT_EXTRUDE32_DEPTH, mode=Mode.SUBTRACT)

    # Cut-Extrude33: up to this plane
    cut_extrude33_end = Plane(origin=(0, 11, 7), z_dir=(-0.059595380047235344, -0.9982226157912, 0))
    # Sketch36 → Cut-Extrude33 (cut, up to the surface)
    with BuildSketch(Plane(origin=(0, 0, 0), x_dir=(0, 0, -1), z_dir=(0, 1, 0)), mode=Mode.PRIVATE) as cut_extrude33_sk1:
        with BuildLine():
            Line((-1.735294118, -2.828823529), (-3, 2.23))
            Line((-3, 2.23), (-4, 2.23))
            Line((-4, 2.23), (-5.264705882, -2.828823529))
            ThreePointArc((-5.264705882, -2.828823529), (-3.5, -1.77), (-1.735294118, -2.828823529))
        make_face()
    cut_extrude33_tool1 = split(extrude(cut_extrude33_sk1.sketch, amount=CUT_EXTRUDE33_REACH, mode=Mode.PRIVATE), bisect_by=cut_extrude33_end, keep=Keep.BOTH, mode=Mode.PRIVATE)
    add(cut_extrude33_tool1.solids().sort_by_distance((0.278692, 0, 3.5))[0], mode=Mode.SUBTRACT)
    # Sketch36 → Cut-Extrude33 (cut, up to the surface)
    with BuildSketch(Plane(origin=(0, 0, 0), x_dir=(0, 0, -1), z_dir=(0, 1, 0)), mode=Mode.PRIVATE) as cut_extrude33_sk2:
        with BuildLine():
            Line((-1.5, -3.77), (-1.735294118, -2.828823529))
            ThreePointArc((-1.735294118, -2.828823529), (-3.5, -1.77), (-5.264705882, -2.828823529))
            Line((-5.264705882, -2.828823529), (-5.5, -3.77))
            ThreePointArc((-5.5, -3.77), (-3.5, -5.77), (-1.5, -3.77))
        make_face()
    cut_extrude33_tool2 = split(extrude(cut_extrude33_sk2.sketch, amount=CUT_EXTRUDE33_REACH, mode=Mode.PRIVATE), bisect_by=cut_extrude33_end, keep=Keep.BOTH, mode=Mode.PRIVATE)
    add(cut_extrude33_tool2.solids().sort_by_distance((3.772955, 0, 3.5))[0], mode=Mode.SUBTRACT)

    # Cut-Extrude34: up to this plane
    cut_extrude34_end = Plane(origin=(0, 0, 7), z_dir=(0, 0, -1))
    # Sketch38 → Cut-Extrude34 (cut, up to the surface)
    with BuildSketch(Plane(origin=(4.875, 0, -4.875), x_dir=(-0.7071067811865476, 0, -0.7071067811865476), z_dir=(0.7071067811865476, 0, -0.7071067811865476)), mode=Mode.PRIVATE) as cut_extrude34_sk1:
        with Locations((-14.802752351, 8.579711474)):
            Circle(SKETCH38_R)
    cut_extrude34_tool1 = split(extrude(cut_extrude34_sk1.sketch, amount=-CUT_EXTRUDE34_REACH, mode=Mode.PRIVATE), bisect_by=cut_extrude34_end, keep=Keep.BOTH, mode=Mode.PRIVATE)
    add(cut_extrude34_tool1.solids().sort_by_distance((15.342127, 8.579711, 5.592127))[0], mode=Mode.SUBTRACT)
    # Sketch38 → Cut-Extrude34 (cut, up to the surface)
    with BuildSketch(Plane(origin=(4.875, 0, -4.875), x_dir=(-0.7071067811865476, 0, -0.7071067811865476), z_dir=(0.7071067811865476, 0, -0.7071067811865476)), mode=Mode.PRIVATE) as cut_extrude34_sk2:
        with BuildLine():
            Line((-14.202752351, 5.8), (-14.202752351, 4.8))
            ThreePointArc((-14.202752351, 4.8), (-14.802752351, 4.2), (-15.402752351, 4.8))
            Line((-15.402752351, 4.8), (-15.402752351, 5.8))
            ThreePointArc((-15.402752351, 5.8), (-14.802752351, 6.4), (-14.202752351, 5.8))
        make_face()
    cut_extrude34_tool2 = split(extrude(cut_extrude34_sk2.sketch, amount=-CUT_EXTRUDE34_REACH, mode=Mode.PRIVATE), bisect_by=cut_extrude34_end, keep=Keep.BOTH, mode=Mode.PRIVATE)
    add(cut_extrude34_tool2.solids().sort_by_distance((15.342127, 5.3, 5.592127))[0], mode=Mode.SUBTRACT)
    # Sketch38 → Cut-Extrude34 (cut, up to the surface)
    with BuildSketch(Plane(origin=(4.875, 0, -4.875), x_dir=(-0.7071067811865476, 0, -0.7071067811865476), z_dir=(0.7071067811865476, 0, -0.7071067811865476)), mode=Mode.PRIVATE) as cut_extrude34_sk3:
        with BuildLine():
            Line((-14.202752351, 3.3), (-14.202752351, 2.3))
            ThreePointArc((-14.202752351, 2.3), (-14.802752351, 1.7), (-15.402752351, 2.3))
            Line((-15.402752351, 2.3), (-15.402752351, 3.3))
            ThreePointArc((-15.402752351, 3.3), (-14.802752351, 3.9), (-14.202752351, 3.3))
        make_face()
    cut_extrude34_tool3 = split(extrude(cut_extrude34_sk3.sketch, amount=-CUT_EXTRUDE34_REACH, mode=Mode.PRIVATE), bisect_by=cut_extrude34_end, keep=Keep.BOTH, mode=Mode.PRIVATE)
    add(cut_extrude34_tool3.solids().sort_by_distance((15.342127, 2.8, 5.592127))[0], mode=Mode.SUBTRACT)

    # Sketch39 → Boss-Extrude13 (add)
    with BuildSketch(Plane(origin=(0, 0, 0), x_dir=(-1, 0, 0), z_dir=(0, 0, -1))):
        Polygon((-2.962610506, 3.75), (-2.962610506, 2.180433367), (-1.962610506, 2.120731874), (-1.962610506, 4.345491503), (-2.962610506, 4.345491503), align=None)
        Polygon((-2.962610506, 2.180433367), (-9.755327865, 2.585968732), (-9.755327865, 1.584188183), (-1.962610506, 1.118951325), (-1.962610506, 2.120731874), align=None)
        Polygon((-1.962610506, 6.654508497), (-1.962610506, 8.879268126), (-2.962610506, 8.819566633), (-2.962610506, 7.25), (-2.962610506, 6.654508497), align=None)
        Polygon((-1.962610506, 8.879268126), (-1.962610506, 9.881048675), (-9.755327865, 9.415811817), (-9.755327865, 8.414031268), (-2.962610506, 8.819566633), align=None)
    extrude(amount=BOSS_EXTRUDE13_DEPTH)

    # Sketch41 → Cut-Extrude35 (cut)
    with BuildSketch(Plane(origin=(0, 0, 0), x_dir=(-1, 0, 0), z_dir=(0, 0, -1))):
        with BuildLine():
            Line((-8.969406145, 8.195669333), (-7.567261367, 8.195669333))
            ThreePointArc((-7.567261367, 8.195669333), (-7.067261367, 7.695669333), (-7.567261367, 7.195669333))
            Line((-7.567261367, 7.195669333), (-8.969406145, 7.195669333))
            ThreePointArc((-8.969406145, 7.195669333), (-9.469406145, 7.695669333), (-8.969406145, 8.195669333))
        make_face()
        with BuildLine():
            Line((-8.969406145, 3.767476747), (-7.567261367, 3.767476747))
            ThreePointArc((-7.567261367, 3.767476747), (-7.067261367, 3.267476747), (-7.567261367, 2.767476747))
            Line((-7.567261367, 2.767476747), (-8.969406145, 2.767476747))
            ThreePointArc((-8.969406145, 2.767476747), (-9.469406145, 3.267476747), (-8.969406145, 3.767476747))
        make_face()
    extrude(amount=-CUT_EXTRUDE35_DEPTH, mode=Mode.SUBTRACT)


solid = part.part
